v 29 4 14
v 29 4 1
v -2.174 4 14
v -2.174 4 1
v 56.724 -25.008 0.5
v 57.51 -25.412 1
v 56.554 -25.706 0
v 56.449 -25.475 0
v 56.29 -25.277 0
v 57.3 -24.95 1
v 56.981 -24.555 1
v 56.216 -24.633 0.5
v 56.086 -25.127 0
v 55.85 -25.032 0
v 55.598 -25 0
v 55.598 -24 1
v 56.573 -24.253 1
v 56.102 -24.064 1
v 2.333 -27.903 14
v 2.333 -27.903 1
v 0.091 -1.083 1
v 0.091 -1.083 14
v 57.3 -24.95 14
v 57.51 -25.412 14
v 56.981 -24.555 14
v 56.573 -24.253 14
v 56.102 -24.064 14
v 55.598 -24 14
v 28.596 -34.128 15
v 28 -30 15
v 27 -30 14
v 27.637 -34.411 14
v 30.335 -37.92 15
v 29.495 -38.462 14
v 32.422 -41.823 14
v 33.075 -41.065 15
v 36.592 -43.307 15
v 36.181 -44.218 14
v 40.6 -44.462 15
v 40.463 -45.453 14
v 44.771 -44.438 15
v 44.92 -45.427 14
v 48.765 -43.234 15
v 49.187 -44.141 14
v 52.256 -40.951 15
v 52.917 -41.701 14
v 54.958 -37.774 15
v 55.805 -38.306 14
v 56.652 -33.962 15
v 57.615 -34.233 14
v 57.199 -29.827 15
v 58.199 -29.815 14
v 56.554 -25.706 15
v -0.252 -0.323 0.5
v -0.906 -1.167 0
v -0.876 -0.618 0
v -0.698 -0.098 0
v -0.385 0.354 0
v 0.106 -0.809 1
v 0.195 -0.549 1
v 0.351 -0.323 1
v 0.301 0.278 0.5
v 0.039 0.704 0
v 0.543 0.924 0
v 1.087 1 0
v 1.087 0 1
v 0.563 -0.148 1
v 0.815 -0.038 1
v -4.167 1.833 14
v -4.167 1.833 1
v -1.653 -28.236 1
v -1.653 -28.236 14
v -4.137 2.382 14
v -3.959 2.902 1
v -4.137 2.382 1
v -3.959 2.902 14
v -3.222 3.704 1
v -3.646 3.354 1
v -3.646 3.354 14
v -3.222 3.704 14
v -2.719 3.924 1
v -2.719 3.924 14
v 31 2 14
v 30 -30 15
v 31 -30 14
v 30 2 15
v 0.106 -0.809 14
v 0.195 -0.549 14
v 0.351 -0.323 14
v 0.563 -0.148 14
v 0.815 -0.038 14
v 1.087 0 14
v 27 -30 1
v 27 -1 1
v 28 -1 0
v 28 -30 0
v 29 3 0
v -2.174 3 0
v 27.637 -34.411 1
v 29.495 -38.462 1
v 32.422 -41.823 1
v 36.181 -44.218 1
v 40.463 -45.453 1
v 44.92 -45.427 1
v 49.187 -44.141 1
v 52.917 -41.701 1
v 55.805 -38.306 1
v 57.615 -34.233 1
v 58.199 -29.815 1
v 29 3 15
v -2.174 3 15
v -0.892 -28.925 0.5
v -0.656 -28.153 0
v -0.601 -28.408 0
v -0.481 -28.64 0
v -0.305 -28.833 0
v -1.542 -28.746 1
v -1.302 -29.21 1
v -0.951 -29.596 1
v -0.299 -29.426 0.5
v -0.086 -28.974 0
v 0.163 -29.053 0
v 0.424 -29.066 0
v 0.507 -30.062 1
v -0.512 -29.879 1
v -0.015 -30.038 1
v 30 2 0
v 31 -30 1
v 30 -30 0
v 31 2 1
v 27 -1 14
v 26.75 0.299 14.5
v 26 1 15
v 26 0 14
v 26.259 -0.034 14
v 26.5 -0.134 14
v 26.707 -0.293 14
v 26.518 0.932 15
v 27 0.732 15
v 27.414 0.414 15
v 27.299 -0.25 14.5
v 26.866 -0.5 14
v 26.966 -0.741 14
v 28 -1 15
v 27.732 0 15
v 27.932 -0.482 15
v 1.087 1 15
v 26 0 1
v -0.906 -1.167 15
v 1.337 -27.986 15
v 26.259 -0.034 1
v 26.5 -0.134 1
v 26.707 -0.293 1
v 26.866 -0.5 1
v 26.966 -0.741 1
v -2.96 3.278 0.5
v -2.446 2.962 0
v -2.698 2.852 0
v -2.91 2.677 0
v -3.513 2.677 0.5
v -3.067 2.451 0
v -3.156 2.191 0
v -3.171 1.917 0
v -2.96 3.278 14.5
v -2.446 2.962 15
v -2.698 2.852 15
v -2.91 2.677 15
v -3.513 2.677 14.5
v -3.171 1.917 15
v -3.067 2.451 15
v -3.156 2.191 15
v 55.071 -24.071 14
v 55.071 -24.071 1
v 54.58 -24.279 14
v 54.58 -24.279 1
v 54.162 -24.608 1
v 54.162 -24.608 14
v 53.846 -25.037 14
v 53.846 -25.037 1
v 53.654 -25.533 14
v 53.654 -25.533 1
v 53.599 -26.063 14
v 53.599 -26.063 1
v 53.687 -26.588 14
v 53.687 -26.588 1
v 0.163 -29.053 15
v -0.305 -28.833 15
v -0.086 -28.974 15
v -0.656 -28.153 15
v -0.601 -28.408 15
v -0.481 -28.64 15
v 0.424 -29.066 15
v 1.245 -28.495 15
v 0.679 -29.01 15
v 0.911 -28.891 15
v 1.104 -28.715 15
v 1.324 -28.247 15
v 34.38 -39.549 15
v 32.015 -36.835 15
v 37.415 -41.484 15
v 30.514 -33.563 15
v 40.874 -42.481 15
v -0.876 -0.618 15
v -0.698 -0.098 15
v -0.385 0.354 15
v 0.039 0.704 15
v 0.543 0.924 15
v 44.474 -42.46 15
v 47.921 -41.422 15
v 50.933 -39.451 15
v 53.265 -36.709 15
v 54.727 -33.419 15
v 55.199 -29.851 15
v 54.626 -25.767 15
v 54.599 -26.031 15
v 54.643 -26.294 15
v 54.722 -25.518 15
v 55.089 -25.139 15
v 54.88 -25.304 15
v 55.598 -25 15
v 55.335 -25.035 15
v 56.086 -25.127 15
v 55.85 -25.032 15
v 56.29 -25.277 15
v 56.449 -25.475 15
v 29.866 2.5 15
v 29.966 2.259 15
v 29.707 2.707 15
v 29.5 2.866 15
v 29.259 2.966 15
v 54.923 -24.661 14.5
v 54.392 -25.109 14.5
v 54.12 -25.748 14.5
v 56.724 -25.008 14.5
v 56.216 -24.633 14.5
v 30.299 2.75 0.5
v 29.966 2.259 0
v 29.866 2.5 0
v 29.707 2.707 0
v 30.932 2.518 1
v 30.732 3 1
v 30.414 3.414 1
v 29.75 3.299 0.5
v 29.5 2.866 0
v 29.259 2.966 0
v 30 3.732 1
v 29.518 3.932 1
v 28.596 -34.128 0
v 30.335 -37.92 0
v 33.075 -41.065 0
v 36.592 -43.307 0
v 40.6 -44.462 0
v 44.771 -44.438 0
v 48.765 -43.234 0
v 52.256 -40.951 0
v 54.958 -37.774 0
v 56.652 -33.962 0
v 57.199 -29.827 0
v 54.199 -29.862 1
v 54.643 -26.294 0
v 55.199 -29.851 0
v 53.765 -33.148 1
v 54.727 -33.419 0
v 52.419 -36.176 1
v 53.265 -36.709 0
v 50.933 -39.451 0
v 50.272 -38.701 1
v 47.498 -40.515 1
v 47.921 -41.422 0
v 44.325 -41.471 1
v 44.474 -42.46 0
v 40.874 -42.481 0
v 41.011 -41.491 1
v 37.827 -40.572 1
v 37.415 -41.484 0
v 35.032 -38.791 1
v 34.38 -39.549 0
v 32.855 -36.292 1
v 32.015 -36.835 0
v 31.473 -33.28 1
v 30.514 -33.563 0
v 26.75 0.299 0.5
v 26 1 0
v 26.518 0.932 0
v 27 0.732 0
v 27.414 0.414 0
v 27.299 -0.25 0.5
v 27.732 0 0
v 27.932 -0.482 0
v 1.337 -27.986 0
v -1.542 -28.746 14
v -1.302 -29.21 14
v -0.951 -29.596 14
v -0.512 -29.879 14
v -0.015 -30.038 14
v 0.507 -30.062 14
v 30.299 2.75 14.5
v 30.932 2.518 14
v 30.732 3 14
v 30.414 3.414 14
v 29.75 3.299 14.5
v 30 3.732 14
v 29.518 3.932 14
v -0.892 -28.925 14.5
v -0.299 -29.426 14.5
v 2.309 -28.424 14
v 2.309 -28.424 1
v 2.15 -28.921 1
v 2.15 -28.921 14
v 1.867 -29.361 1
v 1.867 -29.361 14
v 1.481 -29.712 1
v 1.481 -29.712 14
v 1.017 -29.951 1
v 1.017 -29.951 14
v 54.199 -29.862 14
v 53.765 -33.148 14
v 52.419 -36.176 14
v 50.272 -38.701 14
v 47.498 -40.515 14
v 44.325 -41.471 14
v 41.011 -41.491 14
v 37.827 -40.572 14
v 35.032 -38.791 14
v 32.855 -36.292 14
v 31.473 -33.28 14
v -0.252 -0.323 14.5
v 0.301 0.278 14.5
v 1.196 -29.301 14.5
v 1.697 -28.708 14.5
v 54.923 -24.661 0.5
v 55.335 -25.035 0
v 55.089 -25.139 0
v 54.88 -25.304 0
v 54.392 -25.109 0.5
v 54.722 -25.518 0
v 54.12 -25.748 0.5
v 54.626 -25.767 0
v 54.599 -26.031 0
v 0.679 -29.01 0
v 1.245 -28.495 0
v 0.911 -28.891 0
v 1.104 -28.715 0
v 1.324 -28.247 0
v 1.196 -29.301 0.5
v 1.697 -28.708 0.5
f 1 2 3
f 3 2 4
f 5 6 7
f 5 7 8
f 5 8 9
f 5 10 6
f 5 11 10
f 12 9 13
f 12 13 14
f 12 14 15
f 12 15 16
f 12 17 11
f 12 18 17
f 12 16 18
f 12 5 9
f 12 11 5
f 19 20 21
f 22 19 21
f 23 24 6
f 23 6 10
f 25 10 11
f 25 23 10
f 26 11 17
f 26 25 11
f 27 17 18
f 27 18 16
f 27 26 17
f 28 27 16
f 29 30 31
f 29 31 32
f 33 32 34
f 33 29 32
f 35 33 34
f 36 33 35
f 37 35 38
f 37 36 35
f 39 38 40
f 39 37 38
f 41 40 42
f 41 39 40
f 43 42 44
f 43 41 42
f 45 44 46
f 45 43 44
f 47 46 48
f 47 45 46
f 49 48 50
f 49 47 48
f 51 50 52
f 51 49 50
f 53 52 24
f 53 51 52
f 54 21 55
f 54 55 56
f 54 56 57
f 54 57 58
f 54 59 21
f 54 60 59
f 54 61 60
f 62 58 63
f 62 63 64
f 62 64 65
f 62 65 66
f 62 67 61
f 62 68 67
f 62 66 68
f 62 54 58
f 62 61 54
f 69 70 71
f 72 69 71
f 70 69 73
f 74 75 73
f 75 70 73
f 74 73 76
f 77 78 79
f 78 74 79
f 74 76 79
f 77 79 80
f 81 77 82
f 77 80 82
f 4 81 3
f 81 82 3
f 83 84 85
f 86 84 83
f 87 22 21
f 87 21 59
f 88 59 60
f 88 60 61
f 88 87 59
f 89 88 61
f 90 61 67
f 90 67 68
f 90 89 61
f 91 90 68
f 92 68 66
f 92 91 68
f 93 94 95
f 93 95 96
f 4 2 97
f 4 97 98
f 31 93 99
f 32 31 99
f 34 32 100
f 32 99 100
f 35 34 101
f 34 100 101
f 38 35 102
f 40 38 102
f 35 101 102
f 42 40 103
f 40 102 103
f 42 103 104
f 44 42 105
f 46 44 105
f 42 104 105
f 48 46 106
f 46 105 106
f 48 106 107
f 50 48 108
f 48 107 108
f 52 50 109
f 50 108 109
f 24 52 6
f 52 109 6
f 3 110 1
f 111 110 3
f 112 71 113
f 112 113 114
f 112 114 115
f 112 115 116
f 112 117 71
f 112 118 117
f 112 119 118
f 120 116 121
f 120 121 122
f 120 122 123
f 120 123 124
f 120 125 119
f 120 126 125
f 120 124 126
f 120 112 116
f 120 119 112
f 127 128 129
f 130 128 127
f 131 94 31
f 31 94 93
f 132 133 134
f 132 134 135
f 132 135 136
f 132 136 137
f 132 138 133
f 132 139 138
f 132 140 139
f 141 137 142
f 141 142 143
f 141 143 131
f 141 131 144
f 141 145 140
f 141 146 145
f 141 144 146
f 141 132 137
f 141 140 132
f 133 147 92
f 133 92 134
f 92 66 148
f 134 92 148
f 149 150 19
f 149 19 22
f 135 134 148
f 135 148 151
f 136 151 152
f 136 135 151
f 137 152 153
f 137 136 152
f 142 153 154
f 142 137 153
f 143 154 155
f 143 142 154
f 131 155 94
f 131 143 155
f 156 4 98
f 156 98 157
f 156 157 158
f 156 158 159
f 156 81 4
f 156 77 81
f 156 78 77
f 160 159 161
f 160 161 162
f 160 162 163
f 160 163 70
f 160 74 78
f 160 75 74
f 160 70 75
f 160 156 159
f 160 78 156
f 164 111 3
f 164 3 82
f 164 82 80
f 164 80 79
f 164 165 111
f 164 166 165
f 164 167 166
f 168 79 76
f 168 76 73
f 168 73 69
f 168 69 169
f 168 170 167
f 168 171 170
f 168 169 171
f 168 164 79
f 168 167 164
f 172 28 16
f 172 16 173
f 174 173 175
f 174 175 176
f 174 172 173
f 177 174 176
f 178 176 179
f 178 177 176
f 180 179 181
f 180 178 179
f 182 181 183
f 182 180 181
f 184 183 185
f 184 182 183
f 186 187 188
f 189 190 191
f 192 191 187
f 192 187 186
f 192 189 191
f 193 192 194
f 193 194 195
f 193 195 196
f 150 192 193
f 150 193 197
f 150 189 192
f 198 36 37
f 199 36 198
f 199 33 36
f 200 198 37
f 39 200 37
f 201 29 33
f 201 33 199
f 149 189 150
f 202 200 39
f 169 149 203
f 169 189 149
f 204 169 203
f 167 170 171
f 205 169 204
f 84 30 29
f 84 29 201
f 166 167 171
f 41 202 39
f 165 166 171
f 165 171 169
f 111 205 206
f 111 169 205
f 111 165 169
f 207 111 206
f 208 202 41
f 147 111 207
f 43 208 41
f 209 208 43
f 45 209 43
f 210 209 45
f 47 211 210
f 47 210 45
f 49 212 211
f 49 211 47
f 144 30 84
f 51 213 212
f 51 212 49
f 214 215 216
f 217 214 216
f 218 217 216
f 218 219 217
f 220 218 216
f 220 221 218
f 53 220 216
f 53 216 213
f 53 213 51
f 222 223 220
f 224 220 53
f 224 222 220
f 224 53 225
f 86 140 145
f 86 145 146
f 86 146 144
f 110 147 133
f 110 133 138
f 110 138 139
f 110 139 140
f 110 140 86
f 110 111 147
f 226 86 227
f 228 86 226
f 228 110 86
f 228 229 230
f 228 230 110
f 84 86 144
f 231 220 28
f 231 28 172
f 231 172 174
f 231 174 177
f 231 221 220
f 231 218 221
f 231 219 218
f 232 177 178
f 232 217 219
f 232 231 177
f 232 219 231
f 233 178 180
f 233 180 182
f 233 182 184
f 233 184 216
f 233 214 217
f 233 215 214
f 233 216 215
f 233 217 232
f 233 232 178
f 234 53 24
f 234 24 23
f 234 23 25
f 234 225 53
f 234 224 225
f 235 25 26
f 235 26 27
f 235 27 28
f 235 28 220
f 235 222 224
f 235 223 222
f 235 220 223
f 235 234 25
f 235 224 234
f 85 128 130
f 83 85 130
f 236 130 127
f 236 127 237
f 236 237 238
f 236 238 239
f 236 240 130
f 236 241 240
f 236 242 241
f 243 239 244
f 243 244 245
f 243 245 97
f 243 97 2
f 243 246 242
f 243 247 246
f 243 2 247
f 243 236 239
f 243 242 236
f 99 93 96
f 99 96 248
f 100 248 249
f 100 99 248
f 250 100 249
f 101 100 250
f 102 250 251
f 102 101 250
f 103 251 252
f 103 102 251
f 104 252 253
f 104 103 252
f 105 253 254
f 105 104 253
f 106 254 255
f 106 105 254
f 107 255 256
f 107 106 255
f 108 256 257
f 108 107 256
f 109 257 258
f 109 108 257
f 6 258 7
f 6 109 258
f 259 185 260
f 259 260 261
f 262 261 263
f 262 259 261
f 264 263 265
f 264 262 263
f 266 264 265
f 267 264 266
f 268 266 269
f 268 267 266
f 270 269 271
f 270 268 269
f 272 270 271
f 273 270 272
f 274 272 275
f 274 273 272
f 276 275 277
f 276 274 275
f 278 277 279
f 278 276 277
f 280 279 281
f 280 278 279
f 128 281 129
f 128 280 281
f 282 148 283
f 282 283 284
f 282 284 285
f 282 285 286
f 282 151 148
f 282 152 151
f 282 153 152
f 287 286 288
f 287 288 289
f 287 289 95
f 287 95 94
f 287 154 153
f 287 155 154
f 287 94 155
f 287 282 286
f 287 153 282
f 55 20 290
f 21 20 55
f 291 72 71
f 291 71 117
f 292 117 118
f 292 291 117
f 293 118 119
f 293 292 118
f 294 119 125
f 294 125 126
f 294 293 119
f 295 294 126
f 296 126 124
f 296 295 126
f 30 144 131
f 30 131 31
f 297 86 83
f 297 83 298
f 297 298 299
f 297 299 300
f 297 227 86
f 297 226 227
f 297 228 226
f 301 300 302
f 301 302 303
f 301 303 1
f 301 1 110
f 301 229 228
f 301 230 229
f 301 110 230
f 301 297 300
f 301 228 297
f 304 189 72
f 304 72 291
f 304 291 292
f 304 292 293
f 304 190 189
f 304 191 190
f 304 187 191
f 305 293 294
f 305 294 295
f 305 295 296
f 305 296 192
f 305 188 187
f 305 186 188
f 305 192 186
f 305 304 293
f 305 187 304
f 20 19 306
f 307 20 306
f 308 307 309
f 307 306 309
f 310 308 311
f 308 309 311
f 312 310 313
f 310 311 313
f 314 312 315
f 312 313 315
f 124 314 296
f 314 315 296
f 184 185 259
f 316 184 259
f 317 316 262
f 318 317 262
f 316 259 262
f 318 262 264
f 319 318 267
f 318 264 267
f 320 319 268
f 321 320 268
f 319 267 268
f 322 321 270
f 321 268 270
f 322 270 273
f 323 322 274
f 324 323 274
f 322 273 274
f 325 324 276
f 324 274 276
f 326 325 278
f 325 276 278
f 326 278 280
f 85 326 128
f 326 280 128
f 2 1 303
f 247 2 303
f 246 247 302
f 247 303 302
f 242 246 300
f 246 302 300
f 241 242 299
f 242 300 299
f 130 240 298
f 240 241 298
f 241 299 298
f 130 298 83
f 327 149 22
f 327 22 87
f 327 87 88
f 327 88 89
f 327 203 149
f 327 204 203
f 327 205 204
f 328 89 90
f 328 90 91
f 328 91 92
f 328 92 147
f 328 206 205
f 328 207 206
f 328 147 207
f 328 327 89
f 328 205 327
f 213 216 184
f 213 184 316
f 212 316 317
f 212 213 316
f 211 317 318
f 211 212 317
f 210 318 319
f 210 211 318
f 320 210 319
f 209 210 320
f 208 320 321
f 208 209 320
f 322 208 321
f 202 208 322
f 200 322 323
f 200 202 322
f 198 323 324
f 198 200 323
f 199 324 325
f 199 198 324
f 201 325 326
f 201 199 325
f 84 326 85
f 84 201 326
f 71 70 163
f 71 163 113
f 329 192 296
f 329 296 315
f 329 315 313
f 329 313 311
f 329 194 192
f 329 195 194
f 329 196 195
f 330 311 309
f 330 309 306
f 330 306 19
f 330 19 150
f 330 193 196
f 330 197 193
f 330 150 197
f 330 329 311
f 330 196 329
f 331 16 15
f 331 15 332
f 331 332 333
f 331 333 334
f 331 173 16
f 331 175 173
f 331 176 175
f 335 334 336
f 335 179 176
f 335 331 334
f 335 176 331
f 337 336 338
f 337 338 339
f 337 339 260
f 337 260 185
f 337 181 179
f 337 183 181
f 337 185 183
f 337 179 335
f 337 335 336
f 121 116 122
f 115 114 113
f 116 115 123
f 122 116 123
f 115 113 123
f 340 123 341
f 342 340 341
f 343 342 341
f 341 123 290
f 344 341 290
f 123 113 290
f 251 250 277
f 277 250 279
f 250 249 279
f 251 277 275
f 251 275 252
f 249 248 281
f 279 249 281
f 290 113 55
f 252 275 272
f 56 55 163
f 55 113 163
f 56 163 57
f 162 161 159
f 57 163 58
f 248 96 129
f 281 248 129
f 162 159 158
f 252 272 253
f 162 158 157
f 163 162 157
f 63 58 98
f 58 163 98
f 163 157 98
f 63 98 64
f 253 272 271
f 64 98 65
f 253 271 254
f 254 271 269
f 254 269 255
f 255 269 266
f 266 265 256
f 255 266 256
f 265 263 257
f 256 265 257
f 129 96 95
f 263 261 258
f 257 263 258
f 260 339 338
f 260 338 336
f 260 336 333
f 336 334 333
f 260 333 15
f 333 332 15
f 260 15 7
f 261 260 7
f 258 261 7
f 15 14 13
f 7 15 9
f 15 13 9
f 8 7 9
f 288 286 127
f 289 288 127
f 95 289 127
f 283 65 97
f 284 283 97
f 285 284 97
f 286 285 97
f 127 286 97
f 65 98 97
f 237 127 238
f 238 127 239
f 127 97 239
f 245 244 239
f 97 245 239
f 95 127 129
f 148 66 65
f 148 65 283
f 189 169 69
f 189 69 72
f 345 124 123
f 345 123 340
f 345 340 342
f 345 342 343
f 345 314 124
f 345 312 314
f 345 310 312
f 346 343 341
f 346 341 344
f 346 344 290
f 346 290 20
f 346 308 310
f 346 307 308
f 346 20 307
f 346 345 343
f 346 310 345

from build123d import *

# Parameters (mm, degrees)
F1_DEPTH = 15
F2_R     = 1.99999
F3_R     = 2
F4_R     = 1
F5_SIZE  = 1


# Not quite as in the source:
# - a fillet or chamfer is up to 0.001 mm smaller than in the source, because OpenCascade refuses the exact size


with BuildPart() as f1:
    # F0 (on Top) → F1 (new body)
    with BuildSketch(Plane.XY):
        with BuildLine():
            Line((2.5, -29.8956518578), (0, 0))
            Line((0, 0), (27, 0))
            Line((27, 0), (27, -30))
            ThreePointArc((27, -30), (45.6594117082, -45.2970585408), (57, -24))
            Line((57, -24), (52.5277389168, -24))
            ThreePointArc((52.5277389168, -24), (45.7143401039, -41.1741167757), (31, -30))
            Line((31, -30), (31, 4))
            Line((31, 4), (-4.348458452, 4))
            Line((-4.348458452, 4), (-1.4860869144, -30.2289851911))
            Line((-1.4860869144, -30.2289851911), (2.5, -29.8956518578))
        make_face()
    extrude(amount=F1_DEPTH)

    # F2 (radius 2 in the source; OpenCascade refuses exactly that, so slightly less here)
    f2_edges = [f1.edges().sort_by_distance(p)[0] for p in [
        (2.5, -29.895652, 7.5),
        (-1.486087, -30.228985, 7.5),
        (52.527739, -24, 7.5),
        (57, -24, 7.5),
    ]]
    fillet(f2_edges, radius=F2_R)

    # F3
    f3_edges = [f1.edges().sort_by_distance(p)[0] for p in [
        (31, 4, 7.5),
        (-4.348458, 4, 7.5),
    ]]
    fillet(f3_edges, radius=F3_R)

    # F4
    f4_edges = [f1.edges().sort_by_distance(p)[0] for p in [
        (0, 0, 7.5),
        (27, 0, 7.5),
    ]]
    fillet(f4_edges, radius=F4_R)

    # F5
    f5_edges = [f1.edges().sort_by_distance(p)[0] for p in [
        (1.211964, -14.492976, 15),
        (0.351135, -0.322997, 15),
        (1.867439, -29.360721, 15),
        (13.543557, 0, 15),
        (0.506957, -30.062319, 15),
        (26.707107, -0.292893, 15),
        (-0.951156, -29.596424, 15),
        (27, -15.5, 15),
        (-2.910013, -13.201309, 15),
        (44.919918, -45.426535, 15),
        (-3.646189, 3.354006, 15),
        (56.78664, -24.391198, 15),
        (13.412885, 4, 15),
        (55.598458, -24, 15),
        (30.414214, 3.414214, 15),
        (53.989656, -24.81182, 15),
        (31, -14, 15),
        (44.32507, -41.471013, 15),
        (1.211964, -14.492976, 0),
        (0.351135, -0.322997, 0),
        (1.867439, -29.360721, 0),
        (13.543557, 0, 0),
        (0.506957, -30.062319, 0),
        (26.707107, -0.292893, 0),
        (-0.951156, -29.596424, 0),
        (27, -15.5, 0),
        (-2.910013, -13.201309, 0),
        (44.919918, -45.426535, 0),
        (-3.646189, 3.354006, 0),
        (56.78664, -24.391198, 0),
        (13.412885, 4, 0),
        (55.598458, -24, 0),
        (30.414214, 3.414214, 0),
        (53.989656, -24.81182, 0),
        (31, -14, 0),
        (44.32507, -41.471013, 0),
    ]]
    chamfer(f5_edges, length=F5_SIZE)


solid = f1.part
